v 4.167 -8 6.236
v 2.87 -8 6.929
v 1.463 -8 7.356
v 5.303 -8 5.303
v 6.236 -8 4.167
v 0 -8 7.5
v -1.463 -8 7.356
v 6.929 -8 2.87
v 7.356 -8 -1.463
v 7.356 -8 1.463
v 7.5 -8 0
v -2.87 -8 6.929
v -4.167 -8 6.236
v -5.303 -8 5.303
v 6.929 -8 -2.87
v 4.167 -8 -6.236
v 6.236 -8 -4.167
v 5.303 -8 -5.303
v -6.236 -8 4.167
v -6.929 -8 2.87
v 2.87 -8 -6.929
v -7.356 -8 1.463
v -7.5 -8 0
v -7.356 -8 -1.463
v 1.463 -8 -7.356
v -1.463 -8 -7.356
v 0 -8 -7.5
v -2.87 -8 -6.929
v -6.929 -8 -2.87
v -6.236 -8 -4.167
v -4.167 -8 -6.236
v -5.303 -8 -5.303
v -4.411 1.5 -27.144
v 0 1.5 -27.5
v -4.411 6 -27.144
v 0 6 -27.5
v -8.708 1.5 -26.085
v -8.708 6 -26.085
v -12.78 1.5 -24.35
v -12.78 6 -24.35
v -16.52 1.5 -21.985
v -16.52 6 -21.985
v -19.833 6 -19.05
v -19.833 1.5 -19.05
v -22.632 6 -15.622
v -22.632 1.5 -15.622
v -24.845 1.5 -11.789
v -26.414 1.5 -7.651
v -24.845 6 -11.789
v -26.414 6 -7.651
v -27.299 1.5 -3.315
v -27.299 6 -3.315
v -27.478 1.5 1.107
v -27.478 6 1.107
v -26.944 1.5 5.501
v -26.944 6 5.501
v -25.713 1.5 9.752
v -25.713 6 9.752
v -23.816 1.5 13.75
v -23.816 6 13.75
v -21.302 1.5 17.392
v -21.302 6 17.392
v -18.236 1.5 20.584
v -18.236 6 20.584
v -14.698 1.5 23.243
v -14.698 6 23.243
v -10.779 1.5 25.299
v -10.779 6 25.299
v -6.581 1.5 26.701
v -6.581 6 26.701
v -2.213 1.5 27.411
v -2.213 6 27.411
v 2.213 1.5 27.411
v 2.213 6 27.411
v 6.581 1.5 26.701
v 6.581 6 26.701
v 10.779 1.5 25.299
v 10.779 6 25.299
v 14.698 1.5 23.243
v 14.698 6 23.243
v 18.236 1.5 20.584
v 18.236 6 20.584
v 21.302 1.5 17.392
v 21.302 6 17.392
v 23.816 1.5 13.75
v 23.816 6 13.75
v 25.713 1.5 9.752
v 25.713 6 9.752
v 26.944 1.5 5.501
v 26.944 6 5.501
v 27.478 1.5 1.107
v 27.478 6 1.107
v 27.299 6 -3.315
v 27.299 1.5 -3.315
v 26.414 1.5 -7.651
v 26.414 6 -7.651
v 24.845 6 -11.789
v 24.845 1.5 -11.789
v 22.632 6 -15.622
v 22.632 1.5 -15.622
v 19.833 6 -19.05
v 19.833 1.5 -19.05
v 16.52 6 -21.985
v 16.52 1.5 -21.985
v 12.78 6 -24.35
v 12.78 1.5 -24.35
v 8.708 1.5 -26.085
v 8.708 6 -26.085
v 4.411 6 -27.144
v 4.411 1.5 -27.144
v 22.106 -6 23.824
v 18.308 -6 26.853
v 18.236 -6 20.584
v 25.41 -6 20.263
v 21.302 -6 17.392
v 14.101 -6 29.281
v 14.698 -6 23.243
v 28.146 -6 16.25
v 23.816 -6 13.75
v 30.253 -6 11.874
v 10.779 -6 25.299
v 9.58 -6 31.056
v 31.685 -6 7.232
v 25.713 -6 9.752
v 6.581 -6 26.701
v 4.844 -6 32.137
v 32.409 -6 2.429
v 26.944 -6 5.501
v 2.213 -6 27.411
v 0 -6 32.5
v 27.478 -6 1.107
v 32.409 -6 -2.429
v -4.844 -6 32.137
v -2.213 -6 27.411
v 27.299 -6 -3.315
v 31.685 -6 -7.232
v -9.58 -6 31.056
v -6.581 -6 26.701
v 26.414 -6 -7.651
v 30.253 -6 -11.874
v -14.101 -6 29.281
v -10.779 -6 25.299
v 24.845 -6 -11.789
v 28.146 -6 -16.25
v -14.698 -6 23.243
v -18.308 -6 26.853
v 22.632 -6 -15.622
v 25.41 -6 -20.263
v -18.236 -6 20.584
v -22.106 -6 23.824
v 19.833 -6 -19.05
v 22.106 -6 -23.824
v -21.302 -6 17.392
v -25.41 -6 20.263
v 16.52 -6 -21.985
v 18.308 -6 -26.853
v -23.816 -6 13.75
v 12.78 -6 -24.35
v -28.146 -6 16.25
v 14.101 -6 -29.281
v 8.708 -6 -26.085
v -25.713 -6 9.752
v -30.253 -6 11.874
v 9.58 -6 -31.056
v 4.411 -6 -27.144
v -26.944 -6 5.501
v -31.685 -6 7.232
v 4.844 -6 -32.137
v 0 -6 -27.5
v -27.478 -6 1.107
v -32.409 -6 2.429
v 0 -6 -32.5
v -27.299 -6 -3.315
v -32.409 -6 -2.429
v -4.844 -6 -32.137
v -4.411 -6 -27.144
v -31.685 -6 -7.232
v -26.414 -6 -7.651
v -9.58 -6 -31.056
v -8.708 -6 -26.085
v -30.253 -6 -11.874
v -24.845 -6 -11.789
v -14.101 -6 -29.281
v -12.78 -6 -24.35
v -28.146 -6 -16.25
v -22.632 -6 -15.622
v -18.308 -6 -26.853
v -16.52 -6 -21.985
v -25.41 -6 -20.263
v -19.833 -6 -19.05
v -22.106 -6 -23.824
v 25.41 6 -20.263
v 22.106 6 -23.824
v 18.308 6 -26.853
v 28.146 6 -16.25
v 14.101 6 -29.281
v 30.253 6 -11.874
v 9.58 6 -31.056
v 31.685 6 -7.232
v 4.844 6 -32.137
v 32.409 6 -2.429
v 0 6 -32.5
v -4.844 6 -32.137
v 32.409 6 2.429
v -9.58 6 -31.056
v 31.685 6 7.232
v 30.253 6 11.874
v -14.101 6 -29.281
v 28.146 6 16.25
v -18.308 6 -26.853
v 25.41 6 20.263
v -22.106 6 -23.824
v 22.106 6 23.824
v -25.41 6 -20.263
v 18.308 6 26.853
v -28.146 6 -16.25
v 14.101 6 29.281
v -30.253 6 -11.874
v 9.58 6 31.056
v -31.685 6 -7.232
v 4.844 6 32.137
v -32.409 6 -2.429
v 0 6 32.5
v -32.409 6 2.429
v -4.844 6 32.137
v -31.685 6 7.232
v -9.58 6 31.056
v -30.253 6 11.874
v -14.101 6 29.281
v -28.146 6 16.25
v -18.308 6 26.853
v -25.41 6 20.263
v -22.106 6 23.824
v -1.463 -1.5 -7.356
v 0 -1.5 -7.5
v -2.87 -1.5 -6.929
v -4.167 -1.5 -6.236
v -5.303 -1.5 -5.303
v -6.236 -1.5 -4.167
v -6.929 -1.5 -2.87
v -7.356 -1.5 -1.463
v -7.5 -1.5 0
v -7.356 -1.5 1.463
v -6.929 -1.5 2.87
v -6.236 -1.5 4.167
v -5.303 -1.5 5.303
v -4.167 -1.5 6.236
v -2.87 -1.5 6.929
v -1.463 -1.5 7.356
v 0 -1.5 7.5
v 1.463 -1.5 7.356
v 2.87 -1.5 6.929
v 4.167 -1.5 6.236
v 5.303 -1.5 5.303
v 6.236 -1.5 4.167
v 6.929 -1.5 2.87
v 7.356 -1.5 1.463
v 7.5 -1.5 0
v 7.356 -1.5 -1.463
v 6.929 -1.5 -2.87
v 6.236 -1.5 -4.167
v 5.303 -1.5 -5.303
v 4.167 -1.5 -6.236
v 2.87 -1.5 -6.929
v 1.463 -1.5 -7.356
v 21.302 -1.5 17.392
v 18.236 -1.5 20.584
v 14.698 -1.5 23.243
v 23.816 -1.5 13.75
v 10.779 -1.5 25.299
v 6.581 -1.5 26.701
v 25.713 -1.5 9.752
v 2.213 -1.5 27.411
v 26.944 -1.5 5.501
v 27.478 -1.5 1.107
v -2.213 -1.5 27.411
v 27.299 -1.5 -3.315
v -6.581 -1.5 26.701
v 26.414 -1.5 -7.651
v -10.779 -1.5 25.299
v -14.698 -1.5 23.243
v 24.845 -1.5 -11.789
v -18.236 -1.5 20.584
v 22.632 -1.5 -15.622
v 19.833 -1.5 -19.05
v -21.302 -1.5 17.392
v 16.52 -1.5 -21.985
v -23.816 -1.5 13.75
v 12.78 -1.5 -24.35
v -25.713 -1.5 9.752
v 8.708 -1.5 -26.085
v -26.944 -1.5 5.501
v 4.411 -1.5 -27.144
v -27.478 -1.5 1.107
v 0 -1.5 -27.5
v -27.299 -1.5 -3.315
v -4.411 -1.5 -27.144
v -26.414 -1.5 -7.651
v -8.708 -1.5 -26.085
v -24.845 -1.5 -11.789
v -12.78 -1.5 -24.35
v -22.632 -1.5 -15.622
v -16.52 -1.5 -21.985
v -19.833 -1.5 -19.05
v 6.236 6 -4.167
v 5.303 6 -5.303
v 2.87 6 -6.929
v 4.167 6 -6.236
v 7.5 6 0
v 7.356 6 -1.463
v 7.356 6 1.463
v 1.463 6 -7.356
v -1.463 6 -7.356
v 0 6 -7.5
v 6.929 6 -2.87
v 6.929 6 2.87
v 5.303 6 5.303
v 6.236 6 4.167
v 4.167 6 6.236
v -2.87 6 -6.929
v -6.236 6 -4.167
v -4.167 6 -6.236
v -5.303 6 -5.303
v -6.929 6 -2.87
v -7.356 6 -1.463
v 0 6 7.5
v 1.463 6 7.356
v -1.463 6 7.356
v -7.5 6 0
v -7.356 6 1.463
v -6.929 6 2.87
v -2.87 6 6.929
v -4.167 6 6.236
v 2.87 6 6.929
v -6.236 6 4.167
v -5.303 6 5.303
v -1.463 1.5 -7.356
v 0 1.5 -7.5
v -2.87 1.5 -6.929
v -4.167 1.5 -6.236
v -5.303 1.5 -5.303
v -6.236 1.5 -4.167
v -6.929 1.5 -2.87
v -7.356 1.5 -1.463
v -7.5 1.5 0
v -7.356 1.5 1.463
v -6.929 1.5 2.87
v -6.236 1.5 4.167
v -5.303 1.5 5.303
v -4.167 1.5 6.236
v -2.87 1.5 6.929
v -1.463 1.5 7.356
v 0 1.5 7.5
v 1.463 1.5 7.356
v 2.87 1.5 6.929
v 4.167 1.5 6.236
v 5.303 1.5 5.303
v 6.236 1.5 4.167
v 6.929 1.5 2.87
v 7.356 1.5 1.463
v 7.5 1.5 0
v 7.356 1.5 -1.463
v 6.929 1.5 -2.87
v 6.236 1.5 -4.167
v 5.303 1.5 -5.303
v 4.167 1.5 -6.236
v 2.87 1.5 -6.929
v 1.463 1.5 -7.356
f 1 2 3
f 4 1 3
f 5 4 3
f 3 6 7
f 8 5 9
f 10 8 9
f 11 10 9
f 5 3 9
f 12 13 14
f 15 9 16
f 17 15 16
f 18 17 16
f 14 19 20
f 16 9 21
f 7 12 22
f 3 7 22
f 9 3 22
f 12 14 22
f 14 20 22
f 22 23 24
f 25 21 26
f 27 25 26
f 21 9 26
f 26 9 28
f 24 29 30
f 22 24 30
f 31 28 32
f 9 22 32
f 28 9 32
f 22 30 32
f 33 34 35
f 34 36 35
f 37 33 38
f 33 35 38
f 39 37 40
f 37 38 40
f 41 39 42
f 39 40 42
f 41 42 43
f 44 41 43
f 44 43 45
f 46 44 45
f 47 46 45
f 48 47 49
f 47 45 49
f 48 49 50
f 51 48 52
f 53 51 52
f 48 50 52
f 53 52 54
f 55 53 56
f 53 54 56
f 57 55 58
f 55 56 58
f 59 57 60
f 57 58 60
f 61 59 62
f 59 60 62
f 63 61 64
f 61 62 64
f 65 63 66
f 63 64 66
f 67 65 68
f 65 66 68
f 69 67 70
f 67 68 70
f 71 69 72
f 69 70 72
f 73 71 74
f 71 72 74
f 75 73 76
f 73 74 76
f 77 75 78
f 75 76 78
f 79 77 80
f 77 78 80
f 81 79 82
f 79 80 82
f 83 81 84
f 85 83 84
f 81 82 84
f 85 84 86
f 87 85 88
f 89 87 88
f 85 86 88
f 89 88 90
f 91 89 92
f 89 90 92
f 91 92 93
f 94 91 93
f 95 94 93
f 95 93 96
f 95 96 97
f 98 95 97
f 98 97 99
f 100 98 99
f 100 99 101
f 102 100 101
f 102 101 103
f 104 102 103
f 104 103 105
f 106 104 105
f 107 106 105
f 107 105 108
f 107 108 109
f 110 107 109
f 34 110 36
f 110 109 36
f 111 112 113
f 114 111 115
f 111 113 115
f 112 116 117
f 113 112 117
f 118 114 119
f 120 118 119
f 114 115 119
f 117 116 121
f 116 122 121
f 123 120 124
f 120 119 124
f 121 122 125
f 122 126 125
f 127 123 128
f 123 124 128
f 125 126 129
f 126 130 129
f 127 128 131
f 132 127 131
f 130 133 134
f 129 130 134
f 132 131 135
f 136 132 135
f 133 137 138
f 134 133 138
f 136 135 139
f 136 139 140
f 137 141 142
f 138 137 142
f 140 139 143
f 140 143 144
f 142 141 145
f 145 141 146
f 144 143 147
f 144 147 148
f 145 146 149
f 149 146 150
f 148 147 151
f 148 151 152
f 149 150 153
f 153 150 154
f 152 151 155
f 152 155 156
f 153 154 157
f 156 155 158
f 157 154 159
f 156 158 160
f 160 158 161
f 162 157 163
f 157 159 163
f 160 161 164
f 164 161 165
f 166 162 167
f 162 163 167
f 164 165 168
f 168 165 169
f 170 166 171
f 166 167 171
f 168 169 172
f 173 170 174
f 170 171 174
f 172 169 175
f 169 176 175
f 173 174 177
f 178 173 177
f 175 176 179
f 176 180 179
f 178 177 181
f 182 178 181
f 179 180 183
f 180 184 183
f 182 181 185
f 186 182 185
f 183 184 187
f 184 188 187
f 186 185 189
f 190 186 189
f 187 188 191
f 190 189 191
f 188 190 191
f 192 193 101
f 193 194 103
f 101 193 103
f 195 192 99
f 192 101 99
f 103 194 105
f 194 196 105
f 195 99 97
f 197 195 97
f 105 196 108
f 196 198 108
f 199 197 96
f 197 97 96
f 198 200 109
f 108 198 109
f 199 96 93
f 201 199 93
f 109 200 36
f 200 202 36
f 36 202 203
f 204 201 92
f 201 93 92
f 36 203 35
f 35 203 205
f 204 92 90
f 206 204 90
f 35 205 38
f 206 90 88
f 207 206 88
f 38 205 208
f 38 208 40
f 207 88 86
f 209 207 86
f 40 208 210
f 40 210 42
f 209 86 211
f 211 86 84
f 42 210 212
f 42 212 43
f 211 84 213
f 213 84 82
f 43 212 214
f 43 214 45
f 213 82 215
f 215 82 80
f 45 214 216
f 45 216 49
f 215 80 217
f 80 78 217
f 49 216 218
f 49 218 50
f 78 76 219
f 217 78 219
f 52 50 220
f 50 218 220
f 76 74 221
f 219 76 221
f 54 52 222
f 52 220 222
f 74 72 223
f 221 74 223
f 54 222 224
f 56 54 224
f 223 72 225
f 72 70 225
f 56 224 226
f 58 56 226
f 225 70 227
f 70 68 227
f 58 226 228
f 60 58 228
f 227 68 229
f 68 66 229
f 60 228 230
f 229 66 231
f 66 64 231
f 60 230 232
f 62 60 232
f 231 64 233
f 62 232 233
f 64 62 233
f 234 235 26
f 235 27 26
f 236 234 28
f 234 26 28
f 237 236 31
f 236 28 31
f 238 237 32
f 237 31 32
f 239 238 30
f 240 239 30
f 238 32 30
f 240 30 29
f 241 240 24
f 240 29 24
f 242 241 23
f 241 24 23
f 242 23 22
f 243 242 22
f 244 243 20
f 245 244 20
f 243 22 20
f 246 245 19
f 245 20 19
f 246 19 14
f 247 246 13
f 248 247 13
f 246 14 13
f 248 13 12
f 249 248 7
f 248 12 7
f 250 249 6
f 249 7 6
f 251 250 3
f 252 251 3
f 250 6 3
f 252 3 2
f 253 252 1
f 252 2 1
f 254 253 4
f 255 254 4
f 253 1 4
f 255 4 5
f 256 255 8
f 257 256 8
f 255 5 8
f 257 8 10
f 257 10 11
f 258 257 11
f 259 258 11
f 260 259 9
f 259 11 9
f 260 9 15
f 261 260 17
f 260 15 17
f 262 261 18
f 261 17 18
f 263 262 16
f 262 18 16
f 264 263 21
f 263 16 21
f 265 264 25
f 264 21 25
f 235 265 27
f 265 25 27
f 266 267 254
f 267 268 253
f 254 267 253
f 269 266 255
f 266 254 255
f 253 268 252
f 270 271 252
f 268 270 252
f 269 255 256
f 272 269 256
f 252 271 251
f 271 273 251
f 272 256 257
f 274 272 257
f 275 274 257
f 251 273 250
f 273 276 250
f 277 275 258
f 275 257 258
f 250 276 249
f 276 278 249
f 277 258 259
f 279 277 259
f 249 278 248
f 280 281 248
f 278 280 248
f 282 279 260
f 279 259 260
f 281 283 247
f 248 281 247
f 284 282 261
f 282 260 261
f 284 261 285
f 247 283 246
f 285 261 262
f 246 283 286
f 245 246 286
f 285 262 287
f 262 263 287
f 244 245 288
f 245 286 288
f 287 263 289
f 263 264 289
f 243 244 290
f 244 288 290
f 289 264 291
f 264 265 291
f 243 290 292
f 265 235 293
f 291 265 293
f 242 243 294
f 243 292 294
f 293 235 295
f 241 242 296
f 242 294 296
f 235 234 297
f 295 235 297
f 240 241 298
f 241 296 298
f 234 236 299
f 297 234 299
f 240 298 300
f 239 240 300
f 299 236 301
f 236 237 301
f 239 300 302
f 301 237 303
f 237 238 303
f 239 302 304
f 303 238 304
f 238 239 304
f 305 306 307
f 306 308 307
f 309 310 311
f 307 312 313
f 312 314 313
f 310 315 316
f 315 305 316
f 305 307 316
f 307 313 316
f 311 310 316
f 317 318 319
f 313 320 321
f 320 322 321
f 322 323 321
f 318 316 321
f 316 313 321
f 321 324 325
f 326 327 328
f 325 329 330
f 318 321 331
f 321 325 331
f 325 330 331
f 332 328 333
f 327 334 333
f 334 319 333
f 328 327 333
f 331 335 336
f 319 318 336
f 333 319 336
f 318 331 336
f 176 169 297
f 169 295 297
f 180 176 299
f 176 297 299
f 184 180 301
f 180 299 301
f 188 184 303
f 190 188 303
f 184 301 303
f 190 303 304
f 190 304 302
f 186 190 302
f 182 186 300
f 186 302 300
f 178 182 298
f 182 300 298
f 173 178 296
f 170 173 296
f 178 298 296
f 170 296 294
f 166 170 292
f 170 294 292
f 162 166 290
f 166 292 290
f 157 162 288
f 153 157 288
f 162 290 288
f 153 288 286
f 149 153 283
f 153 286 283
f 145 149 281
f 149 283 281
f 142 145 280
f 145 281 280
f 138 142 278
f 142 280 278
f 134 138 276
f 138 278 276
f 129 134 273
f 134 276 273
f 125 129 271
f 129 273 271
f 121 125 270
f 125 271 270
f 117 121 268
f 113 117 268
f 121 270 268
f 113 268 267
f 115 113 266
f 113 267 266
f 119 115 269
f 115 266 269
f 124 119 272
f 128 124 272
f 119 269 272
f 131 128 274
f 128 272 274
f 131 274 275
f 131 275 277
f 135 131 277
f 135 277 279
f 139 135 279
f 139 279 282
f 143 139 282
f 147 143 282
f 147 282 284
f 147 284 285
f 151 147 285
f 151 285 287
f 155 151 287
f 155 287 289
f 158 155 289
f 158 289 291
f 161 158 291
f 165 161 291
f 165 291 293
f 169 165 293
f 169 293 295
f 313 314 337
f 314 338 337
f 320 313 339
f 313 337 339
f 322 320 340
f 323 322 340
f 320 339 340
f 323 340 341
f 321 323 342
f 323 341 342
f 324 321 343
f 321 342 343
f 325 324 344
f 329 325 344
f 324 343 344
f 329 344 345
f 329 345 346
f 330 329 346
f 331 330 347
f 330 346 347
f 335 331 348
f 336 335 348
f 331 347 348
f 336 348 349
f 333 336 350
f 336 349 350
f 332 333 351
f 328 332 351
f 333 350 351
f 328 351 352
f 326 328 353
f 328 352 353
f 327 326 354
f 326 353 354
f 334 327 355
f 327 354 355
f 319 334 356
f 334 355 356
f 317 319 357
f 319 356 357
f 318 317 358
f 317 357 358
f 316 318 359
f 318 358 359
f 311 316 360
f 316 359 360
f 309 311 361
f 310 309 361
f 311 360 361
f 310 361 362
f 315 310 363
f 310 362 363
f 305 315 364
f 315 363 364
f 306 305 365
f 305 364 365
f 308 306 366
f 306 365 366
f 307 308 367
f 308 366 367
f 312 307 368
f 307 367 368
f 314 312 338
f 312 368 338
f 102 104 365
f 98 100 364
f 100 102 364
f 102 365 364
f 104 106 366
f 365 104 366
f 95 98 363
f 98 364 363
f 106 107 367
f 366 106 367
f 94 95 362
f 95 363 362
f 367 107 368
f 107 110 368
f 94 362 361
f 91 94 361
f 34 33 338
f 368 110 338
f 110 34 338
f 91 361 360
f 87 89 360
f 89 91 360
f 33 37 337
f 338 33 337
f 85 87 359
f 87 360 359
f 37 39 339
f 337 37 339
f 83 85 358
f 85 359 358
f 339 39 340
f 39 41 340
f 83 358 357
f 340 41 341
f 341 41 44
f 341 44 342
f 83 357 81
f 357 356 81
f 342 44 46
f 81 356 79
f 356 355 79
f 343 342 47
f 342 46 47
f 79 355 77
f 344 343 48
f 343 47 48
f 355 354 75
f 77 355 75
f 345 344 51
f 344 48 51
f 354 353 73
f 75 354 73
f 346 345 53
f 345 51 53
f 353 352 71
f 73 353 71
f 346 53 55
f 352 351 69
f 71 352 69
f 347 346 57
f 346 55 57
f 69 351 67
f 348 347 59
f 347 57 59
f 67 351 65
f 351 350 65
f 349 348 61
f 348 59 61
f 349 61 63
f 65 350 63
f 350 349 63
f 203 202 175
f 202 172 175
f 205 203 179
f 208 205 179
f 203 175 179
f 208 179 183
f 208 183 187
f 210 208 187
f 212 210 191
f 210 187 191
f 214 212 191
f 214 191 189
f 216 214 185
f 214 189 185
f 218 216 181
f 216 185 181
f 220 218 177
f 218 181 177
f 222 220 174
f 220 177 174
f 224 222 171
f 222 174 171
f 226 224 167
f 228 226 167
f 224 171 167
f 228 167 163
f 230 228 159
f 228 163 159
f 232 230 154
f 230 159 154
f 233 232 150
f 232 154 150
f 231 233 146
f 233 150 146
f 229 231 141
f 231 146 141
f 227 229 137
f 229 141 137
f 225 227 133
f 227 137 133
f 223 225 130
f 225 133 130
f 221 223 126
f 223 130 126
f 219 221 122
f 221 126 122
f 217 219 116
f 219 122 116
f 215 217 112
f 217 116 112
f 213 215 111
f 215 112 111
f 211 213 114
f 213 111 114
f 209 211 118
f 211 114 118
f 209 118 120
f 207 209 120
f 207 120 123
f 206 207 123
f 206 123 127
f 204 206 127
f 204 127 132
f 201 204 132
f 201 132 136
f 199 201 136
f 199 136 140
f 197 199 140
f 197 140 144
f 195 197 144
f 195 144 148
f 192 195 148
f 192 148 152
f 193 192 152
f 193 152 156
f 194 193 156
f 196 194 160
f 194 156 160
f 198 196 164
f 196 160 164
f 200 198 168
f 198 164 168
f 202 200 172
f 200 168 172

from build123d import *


with BuildPart() as part:
    # Sketch1 → Revolve1 (revolve)
    with BuildSketch(Plane.YZ, mode=Mode.PRIVATE) as revolve1_sk:
        Polygon((6, 0), (6, 7.5), (1.5, 7.5), (1.5, 27.5), (6, 27.5), (6, 32.5), (-6, 32.5), (-6, 27.5), (-1.5, 27.5), (-1.5, 7.5), (-8, 7.5), (-8, 0), align=None)
    revolve(revolve1_sk.sketch.rotate(Axis((0, 0, 0), (0, 1, 0)), 180), axis=Axis((0, 0, 0), (0, 1, 0)))


solid = part.part
